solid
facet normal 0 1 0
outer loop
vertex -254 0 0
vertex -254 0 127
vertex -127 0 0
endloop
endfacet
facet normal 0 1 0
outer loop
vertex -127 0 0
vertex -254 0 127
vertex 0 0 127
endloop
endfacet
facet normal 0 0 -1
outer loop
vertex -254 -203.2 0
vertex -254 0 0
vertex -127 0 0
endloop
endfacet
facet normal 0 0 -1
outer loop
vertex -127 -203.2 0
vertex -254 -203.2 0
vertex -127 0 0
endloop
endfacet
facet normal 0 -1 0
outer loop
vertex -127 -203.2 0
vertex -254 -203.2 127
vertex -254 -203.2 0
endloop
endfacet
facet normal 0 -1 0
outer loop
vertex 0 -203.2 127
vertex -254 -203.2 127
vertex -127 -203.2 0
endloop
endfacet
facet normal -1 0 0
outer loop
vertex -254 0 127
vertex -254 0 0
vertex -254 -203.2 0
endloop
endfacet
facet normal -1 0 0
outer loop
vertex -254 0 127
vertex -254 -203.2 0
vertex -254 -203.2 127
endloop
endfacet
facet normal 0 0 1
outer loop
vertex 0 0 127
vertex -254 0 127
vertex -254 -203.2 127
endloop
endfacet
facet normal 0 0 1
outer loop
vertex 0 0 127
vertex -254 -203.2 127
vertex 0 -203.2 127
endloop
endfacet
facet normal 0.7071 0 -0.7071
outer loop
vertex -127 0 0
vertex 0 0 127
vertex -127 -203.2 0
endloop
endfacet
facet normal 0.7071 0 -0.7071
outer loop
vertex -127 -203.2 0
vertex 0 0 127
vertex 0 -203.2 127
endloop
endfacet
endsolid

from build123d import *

# Parameters (mm, degrees)
F0_W     = 254
F0_H     = 127
F1_DEPTH = 203.2
F2_SIZE2 = 126.99999
F2_SIZE  = 126.99999


# Not quite as in the source:
# - a fillet or chamfer is up to 0.001 mm smaller than in the source, because OpenCascade refuses the exact size


with BuildPart() as f1:
    # F0 (on Front) → F1 (new body)
    with BuildSketch(Plane.XZ):
        with Locations((-127, 63.5)):
            Rectangle(F0_W, F0_H)
    extrude(amount=F1_DEPTH)

    # F2 (size 127 and 127 in the source; OpenCascade refuses exactly that, so slightly less here)
    f2_edges = [f1.edges().sort_by_distance(p)[0] for p in [
        (0, -101.6, 0),
    ]]
    chamfer(f2_edges, length=F2_SIZE, length2=F2_SIZE2)


solid = f1.part
